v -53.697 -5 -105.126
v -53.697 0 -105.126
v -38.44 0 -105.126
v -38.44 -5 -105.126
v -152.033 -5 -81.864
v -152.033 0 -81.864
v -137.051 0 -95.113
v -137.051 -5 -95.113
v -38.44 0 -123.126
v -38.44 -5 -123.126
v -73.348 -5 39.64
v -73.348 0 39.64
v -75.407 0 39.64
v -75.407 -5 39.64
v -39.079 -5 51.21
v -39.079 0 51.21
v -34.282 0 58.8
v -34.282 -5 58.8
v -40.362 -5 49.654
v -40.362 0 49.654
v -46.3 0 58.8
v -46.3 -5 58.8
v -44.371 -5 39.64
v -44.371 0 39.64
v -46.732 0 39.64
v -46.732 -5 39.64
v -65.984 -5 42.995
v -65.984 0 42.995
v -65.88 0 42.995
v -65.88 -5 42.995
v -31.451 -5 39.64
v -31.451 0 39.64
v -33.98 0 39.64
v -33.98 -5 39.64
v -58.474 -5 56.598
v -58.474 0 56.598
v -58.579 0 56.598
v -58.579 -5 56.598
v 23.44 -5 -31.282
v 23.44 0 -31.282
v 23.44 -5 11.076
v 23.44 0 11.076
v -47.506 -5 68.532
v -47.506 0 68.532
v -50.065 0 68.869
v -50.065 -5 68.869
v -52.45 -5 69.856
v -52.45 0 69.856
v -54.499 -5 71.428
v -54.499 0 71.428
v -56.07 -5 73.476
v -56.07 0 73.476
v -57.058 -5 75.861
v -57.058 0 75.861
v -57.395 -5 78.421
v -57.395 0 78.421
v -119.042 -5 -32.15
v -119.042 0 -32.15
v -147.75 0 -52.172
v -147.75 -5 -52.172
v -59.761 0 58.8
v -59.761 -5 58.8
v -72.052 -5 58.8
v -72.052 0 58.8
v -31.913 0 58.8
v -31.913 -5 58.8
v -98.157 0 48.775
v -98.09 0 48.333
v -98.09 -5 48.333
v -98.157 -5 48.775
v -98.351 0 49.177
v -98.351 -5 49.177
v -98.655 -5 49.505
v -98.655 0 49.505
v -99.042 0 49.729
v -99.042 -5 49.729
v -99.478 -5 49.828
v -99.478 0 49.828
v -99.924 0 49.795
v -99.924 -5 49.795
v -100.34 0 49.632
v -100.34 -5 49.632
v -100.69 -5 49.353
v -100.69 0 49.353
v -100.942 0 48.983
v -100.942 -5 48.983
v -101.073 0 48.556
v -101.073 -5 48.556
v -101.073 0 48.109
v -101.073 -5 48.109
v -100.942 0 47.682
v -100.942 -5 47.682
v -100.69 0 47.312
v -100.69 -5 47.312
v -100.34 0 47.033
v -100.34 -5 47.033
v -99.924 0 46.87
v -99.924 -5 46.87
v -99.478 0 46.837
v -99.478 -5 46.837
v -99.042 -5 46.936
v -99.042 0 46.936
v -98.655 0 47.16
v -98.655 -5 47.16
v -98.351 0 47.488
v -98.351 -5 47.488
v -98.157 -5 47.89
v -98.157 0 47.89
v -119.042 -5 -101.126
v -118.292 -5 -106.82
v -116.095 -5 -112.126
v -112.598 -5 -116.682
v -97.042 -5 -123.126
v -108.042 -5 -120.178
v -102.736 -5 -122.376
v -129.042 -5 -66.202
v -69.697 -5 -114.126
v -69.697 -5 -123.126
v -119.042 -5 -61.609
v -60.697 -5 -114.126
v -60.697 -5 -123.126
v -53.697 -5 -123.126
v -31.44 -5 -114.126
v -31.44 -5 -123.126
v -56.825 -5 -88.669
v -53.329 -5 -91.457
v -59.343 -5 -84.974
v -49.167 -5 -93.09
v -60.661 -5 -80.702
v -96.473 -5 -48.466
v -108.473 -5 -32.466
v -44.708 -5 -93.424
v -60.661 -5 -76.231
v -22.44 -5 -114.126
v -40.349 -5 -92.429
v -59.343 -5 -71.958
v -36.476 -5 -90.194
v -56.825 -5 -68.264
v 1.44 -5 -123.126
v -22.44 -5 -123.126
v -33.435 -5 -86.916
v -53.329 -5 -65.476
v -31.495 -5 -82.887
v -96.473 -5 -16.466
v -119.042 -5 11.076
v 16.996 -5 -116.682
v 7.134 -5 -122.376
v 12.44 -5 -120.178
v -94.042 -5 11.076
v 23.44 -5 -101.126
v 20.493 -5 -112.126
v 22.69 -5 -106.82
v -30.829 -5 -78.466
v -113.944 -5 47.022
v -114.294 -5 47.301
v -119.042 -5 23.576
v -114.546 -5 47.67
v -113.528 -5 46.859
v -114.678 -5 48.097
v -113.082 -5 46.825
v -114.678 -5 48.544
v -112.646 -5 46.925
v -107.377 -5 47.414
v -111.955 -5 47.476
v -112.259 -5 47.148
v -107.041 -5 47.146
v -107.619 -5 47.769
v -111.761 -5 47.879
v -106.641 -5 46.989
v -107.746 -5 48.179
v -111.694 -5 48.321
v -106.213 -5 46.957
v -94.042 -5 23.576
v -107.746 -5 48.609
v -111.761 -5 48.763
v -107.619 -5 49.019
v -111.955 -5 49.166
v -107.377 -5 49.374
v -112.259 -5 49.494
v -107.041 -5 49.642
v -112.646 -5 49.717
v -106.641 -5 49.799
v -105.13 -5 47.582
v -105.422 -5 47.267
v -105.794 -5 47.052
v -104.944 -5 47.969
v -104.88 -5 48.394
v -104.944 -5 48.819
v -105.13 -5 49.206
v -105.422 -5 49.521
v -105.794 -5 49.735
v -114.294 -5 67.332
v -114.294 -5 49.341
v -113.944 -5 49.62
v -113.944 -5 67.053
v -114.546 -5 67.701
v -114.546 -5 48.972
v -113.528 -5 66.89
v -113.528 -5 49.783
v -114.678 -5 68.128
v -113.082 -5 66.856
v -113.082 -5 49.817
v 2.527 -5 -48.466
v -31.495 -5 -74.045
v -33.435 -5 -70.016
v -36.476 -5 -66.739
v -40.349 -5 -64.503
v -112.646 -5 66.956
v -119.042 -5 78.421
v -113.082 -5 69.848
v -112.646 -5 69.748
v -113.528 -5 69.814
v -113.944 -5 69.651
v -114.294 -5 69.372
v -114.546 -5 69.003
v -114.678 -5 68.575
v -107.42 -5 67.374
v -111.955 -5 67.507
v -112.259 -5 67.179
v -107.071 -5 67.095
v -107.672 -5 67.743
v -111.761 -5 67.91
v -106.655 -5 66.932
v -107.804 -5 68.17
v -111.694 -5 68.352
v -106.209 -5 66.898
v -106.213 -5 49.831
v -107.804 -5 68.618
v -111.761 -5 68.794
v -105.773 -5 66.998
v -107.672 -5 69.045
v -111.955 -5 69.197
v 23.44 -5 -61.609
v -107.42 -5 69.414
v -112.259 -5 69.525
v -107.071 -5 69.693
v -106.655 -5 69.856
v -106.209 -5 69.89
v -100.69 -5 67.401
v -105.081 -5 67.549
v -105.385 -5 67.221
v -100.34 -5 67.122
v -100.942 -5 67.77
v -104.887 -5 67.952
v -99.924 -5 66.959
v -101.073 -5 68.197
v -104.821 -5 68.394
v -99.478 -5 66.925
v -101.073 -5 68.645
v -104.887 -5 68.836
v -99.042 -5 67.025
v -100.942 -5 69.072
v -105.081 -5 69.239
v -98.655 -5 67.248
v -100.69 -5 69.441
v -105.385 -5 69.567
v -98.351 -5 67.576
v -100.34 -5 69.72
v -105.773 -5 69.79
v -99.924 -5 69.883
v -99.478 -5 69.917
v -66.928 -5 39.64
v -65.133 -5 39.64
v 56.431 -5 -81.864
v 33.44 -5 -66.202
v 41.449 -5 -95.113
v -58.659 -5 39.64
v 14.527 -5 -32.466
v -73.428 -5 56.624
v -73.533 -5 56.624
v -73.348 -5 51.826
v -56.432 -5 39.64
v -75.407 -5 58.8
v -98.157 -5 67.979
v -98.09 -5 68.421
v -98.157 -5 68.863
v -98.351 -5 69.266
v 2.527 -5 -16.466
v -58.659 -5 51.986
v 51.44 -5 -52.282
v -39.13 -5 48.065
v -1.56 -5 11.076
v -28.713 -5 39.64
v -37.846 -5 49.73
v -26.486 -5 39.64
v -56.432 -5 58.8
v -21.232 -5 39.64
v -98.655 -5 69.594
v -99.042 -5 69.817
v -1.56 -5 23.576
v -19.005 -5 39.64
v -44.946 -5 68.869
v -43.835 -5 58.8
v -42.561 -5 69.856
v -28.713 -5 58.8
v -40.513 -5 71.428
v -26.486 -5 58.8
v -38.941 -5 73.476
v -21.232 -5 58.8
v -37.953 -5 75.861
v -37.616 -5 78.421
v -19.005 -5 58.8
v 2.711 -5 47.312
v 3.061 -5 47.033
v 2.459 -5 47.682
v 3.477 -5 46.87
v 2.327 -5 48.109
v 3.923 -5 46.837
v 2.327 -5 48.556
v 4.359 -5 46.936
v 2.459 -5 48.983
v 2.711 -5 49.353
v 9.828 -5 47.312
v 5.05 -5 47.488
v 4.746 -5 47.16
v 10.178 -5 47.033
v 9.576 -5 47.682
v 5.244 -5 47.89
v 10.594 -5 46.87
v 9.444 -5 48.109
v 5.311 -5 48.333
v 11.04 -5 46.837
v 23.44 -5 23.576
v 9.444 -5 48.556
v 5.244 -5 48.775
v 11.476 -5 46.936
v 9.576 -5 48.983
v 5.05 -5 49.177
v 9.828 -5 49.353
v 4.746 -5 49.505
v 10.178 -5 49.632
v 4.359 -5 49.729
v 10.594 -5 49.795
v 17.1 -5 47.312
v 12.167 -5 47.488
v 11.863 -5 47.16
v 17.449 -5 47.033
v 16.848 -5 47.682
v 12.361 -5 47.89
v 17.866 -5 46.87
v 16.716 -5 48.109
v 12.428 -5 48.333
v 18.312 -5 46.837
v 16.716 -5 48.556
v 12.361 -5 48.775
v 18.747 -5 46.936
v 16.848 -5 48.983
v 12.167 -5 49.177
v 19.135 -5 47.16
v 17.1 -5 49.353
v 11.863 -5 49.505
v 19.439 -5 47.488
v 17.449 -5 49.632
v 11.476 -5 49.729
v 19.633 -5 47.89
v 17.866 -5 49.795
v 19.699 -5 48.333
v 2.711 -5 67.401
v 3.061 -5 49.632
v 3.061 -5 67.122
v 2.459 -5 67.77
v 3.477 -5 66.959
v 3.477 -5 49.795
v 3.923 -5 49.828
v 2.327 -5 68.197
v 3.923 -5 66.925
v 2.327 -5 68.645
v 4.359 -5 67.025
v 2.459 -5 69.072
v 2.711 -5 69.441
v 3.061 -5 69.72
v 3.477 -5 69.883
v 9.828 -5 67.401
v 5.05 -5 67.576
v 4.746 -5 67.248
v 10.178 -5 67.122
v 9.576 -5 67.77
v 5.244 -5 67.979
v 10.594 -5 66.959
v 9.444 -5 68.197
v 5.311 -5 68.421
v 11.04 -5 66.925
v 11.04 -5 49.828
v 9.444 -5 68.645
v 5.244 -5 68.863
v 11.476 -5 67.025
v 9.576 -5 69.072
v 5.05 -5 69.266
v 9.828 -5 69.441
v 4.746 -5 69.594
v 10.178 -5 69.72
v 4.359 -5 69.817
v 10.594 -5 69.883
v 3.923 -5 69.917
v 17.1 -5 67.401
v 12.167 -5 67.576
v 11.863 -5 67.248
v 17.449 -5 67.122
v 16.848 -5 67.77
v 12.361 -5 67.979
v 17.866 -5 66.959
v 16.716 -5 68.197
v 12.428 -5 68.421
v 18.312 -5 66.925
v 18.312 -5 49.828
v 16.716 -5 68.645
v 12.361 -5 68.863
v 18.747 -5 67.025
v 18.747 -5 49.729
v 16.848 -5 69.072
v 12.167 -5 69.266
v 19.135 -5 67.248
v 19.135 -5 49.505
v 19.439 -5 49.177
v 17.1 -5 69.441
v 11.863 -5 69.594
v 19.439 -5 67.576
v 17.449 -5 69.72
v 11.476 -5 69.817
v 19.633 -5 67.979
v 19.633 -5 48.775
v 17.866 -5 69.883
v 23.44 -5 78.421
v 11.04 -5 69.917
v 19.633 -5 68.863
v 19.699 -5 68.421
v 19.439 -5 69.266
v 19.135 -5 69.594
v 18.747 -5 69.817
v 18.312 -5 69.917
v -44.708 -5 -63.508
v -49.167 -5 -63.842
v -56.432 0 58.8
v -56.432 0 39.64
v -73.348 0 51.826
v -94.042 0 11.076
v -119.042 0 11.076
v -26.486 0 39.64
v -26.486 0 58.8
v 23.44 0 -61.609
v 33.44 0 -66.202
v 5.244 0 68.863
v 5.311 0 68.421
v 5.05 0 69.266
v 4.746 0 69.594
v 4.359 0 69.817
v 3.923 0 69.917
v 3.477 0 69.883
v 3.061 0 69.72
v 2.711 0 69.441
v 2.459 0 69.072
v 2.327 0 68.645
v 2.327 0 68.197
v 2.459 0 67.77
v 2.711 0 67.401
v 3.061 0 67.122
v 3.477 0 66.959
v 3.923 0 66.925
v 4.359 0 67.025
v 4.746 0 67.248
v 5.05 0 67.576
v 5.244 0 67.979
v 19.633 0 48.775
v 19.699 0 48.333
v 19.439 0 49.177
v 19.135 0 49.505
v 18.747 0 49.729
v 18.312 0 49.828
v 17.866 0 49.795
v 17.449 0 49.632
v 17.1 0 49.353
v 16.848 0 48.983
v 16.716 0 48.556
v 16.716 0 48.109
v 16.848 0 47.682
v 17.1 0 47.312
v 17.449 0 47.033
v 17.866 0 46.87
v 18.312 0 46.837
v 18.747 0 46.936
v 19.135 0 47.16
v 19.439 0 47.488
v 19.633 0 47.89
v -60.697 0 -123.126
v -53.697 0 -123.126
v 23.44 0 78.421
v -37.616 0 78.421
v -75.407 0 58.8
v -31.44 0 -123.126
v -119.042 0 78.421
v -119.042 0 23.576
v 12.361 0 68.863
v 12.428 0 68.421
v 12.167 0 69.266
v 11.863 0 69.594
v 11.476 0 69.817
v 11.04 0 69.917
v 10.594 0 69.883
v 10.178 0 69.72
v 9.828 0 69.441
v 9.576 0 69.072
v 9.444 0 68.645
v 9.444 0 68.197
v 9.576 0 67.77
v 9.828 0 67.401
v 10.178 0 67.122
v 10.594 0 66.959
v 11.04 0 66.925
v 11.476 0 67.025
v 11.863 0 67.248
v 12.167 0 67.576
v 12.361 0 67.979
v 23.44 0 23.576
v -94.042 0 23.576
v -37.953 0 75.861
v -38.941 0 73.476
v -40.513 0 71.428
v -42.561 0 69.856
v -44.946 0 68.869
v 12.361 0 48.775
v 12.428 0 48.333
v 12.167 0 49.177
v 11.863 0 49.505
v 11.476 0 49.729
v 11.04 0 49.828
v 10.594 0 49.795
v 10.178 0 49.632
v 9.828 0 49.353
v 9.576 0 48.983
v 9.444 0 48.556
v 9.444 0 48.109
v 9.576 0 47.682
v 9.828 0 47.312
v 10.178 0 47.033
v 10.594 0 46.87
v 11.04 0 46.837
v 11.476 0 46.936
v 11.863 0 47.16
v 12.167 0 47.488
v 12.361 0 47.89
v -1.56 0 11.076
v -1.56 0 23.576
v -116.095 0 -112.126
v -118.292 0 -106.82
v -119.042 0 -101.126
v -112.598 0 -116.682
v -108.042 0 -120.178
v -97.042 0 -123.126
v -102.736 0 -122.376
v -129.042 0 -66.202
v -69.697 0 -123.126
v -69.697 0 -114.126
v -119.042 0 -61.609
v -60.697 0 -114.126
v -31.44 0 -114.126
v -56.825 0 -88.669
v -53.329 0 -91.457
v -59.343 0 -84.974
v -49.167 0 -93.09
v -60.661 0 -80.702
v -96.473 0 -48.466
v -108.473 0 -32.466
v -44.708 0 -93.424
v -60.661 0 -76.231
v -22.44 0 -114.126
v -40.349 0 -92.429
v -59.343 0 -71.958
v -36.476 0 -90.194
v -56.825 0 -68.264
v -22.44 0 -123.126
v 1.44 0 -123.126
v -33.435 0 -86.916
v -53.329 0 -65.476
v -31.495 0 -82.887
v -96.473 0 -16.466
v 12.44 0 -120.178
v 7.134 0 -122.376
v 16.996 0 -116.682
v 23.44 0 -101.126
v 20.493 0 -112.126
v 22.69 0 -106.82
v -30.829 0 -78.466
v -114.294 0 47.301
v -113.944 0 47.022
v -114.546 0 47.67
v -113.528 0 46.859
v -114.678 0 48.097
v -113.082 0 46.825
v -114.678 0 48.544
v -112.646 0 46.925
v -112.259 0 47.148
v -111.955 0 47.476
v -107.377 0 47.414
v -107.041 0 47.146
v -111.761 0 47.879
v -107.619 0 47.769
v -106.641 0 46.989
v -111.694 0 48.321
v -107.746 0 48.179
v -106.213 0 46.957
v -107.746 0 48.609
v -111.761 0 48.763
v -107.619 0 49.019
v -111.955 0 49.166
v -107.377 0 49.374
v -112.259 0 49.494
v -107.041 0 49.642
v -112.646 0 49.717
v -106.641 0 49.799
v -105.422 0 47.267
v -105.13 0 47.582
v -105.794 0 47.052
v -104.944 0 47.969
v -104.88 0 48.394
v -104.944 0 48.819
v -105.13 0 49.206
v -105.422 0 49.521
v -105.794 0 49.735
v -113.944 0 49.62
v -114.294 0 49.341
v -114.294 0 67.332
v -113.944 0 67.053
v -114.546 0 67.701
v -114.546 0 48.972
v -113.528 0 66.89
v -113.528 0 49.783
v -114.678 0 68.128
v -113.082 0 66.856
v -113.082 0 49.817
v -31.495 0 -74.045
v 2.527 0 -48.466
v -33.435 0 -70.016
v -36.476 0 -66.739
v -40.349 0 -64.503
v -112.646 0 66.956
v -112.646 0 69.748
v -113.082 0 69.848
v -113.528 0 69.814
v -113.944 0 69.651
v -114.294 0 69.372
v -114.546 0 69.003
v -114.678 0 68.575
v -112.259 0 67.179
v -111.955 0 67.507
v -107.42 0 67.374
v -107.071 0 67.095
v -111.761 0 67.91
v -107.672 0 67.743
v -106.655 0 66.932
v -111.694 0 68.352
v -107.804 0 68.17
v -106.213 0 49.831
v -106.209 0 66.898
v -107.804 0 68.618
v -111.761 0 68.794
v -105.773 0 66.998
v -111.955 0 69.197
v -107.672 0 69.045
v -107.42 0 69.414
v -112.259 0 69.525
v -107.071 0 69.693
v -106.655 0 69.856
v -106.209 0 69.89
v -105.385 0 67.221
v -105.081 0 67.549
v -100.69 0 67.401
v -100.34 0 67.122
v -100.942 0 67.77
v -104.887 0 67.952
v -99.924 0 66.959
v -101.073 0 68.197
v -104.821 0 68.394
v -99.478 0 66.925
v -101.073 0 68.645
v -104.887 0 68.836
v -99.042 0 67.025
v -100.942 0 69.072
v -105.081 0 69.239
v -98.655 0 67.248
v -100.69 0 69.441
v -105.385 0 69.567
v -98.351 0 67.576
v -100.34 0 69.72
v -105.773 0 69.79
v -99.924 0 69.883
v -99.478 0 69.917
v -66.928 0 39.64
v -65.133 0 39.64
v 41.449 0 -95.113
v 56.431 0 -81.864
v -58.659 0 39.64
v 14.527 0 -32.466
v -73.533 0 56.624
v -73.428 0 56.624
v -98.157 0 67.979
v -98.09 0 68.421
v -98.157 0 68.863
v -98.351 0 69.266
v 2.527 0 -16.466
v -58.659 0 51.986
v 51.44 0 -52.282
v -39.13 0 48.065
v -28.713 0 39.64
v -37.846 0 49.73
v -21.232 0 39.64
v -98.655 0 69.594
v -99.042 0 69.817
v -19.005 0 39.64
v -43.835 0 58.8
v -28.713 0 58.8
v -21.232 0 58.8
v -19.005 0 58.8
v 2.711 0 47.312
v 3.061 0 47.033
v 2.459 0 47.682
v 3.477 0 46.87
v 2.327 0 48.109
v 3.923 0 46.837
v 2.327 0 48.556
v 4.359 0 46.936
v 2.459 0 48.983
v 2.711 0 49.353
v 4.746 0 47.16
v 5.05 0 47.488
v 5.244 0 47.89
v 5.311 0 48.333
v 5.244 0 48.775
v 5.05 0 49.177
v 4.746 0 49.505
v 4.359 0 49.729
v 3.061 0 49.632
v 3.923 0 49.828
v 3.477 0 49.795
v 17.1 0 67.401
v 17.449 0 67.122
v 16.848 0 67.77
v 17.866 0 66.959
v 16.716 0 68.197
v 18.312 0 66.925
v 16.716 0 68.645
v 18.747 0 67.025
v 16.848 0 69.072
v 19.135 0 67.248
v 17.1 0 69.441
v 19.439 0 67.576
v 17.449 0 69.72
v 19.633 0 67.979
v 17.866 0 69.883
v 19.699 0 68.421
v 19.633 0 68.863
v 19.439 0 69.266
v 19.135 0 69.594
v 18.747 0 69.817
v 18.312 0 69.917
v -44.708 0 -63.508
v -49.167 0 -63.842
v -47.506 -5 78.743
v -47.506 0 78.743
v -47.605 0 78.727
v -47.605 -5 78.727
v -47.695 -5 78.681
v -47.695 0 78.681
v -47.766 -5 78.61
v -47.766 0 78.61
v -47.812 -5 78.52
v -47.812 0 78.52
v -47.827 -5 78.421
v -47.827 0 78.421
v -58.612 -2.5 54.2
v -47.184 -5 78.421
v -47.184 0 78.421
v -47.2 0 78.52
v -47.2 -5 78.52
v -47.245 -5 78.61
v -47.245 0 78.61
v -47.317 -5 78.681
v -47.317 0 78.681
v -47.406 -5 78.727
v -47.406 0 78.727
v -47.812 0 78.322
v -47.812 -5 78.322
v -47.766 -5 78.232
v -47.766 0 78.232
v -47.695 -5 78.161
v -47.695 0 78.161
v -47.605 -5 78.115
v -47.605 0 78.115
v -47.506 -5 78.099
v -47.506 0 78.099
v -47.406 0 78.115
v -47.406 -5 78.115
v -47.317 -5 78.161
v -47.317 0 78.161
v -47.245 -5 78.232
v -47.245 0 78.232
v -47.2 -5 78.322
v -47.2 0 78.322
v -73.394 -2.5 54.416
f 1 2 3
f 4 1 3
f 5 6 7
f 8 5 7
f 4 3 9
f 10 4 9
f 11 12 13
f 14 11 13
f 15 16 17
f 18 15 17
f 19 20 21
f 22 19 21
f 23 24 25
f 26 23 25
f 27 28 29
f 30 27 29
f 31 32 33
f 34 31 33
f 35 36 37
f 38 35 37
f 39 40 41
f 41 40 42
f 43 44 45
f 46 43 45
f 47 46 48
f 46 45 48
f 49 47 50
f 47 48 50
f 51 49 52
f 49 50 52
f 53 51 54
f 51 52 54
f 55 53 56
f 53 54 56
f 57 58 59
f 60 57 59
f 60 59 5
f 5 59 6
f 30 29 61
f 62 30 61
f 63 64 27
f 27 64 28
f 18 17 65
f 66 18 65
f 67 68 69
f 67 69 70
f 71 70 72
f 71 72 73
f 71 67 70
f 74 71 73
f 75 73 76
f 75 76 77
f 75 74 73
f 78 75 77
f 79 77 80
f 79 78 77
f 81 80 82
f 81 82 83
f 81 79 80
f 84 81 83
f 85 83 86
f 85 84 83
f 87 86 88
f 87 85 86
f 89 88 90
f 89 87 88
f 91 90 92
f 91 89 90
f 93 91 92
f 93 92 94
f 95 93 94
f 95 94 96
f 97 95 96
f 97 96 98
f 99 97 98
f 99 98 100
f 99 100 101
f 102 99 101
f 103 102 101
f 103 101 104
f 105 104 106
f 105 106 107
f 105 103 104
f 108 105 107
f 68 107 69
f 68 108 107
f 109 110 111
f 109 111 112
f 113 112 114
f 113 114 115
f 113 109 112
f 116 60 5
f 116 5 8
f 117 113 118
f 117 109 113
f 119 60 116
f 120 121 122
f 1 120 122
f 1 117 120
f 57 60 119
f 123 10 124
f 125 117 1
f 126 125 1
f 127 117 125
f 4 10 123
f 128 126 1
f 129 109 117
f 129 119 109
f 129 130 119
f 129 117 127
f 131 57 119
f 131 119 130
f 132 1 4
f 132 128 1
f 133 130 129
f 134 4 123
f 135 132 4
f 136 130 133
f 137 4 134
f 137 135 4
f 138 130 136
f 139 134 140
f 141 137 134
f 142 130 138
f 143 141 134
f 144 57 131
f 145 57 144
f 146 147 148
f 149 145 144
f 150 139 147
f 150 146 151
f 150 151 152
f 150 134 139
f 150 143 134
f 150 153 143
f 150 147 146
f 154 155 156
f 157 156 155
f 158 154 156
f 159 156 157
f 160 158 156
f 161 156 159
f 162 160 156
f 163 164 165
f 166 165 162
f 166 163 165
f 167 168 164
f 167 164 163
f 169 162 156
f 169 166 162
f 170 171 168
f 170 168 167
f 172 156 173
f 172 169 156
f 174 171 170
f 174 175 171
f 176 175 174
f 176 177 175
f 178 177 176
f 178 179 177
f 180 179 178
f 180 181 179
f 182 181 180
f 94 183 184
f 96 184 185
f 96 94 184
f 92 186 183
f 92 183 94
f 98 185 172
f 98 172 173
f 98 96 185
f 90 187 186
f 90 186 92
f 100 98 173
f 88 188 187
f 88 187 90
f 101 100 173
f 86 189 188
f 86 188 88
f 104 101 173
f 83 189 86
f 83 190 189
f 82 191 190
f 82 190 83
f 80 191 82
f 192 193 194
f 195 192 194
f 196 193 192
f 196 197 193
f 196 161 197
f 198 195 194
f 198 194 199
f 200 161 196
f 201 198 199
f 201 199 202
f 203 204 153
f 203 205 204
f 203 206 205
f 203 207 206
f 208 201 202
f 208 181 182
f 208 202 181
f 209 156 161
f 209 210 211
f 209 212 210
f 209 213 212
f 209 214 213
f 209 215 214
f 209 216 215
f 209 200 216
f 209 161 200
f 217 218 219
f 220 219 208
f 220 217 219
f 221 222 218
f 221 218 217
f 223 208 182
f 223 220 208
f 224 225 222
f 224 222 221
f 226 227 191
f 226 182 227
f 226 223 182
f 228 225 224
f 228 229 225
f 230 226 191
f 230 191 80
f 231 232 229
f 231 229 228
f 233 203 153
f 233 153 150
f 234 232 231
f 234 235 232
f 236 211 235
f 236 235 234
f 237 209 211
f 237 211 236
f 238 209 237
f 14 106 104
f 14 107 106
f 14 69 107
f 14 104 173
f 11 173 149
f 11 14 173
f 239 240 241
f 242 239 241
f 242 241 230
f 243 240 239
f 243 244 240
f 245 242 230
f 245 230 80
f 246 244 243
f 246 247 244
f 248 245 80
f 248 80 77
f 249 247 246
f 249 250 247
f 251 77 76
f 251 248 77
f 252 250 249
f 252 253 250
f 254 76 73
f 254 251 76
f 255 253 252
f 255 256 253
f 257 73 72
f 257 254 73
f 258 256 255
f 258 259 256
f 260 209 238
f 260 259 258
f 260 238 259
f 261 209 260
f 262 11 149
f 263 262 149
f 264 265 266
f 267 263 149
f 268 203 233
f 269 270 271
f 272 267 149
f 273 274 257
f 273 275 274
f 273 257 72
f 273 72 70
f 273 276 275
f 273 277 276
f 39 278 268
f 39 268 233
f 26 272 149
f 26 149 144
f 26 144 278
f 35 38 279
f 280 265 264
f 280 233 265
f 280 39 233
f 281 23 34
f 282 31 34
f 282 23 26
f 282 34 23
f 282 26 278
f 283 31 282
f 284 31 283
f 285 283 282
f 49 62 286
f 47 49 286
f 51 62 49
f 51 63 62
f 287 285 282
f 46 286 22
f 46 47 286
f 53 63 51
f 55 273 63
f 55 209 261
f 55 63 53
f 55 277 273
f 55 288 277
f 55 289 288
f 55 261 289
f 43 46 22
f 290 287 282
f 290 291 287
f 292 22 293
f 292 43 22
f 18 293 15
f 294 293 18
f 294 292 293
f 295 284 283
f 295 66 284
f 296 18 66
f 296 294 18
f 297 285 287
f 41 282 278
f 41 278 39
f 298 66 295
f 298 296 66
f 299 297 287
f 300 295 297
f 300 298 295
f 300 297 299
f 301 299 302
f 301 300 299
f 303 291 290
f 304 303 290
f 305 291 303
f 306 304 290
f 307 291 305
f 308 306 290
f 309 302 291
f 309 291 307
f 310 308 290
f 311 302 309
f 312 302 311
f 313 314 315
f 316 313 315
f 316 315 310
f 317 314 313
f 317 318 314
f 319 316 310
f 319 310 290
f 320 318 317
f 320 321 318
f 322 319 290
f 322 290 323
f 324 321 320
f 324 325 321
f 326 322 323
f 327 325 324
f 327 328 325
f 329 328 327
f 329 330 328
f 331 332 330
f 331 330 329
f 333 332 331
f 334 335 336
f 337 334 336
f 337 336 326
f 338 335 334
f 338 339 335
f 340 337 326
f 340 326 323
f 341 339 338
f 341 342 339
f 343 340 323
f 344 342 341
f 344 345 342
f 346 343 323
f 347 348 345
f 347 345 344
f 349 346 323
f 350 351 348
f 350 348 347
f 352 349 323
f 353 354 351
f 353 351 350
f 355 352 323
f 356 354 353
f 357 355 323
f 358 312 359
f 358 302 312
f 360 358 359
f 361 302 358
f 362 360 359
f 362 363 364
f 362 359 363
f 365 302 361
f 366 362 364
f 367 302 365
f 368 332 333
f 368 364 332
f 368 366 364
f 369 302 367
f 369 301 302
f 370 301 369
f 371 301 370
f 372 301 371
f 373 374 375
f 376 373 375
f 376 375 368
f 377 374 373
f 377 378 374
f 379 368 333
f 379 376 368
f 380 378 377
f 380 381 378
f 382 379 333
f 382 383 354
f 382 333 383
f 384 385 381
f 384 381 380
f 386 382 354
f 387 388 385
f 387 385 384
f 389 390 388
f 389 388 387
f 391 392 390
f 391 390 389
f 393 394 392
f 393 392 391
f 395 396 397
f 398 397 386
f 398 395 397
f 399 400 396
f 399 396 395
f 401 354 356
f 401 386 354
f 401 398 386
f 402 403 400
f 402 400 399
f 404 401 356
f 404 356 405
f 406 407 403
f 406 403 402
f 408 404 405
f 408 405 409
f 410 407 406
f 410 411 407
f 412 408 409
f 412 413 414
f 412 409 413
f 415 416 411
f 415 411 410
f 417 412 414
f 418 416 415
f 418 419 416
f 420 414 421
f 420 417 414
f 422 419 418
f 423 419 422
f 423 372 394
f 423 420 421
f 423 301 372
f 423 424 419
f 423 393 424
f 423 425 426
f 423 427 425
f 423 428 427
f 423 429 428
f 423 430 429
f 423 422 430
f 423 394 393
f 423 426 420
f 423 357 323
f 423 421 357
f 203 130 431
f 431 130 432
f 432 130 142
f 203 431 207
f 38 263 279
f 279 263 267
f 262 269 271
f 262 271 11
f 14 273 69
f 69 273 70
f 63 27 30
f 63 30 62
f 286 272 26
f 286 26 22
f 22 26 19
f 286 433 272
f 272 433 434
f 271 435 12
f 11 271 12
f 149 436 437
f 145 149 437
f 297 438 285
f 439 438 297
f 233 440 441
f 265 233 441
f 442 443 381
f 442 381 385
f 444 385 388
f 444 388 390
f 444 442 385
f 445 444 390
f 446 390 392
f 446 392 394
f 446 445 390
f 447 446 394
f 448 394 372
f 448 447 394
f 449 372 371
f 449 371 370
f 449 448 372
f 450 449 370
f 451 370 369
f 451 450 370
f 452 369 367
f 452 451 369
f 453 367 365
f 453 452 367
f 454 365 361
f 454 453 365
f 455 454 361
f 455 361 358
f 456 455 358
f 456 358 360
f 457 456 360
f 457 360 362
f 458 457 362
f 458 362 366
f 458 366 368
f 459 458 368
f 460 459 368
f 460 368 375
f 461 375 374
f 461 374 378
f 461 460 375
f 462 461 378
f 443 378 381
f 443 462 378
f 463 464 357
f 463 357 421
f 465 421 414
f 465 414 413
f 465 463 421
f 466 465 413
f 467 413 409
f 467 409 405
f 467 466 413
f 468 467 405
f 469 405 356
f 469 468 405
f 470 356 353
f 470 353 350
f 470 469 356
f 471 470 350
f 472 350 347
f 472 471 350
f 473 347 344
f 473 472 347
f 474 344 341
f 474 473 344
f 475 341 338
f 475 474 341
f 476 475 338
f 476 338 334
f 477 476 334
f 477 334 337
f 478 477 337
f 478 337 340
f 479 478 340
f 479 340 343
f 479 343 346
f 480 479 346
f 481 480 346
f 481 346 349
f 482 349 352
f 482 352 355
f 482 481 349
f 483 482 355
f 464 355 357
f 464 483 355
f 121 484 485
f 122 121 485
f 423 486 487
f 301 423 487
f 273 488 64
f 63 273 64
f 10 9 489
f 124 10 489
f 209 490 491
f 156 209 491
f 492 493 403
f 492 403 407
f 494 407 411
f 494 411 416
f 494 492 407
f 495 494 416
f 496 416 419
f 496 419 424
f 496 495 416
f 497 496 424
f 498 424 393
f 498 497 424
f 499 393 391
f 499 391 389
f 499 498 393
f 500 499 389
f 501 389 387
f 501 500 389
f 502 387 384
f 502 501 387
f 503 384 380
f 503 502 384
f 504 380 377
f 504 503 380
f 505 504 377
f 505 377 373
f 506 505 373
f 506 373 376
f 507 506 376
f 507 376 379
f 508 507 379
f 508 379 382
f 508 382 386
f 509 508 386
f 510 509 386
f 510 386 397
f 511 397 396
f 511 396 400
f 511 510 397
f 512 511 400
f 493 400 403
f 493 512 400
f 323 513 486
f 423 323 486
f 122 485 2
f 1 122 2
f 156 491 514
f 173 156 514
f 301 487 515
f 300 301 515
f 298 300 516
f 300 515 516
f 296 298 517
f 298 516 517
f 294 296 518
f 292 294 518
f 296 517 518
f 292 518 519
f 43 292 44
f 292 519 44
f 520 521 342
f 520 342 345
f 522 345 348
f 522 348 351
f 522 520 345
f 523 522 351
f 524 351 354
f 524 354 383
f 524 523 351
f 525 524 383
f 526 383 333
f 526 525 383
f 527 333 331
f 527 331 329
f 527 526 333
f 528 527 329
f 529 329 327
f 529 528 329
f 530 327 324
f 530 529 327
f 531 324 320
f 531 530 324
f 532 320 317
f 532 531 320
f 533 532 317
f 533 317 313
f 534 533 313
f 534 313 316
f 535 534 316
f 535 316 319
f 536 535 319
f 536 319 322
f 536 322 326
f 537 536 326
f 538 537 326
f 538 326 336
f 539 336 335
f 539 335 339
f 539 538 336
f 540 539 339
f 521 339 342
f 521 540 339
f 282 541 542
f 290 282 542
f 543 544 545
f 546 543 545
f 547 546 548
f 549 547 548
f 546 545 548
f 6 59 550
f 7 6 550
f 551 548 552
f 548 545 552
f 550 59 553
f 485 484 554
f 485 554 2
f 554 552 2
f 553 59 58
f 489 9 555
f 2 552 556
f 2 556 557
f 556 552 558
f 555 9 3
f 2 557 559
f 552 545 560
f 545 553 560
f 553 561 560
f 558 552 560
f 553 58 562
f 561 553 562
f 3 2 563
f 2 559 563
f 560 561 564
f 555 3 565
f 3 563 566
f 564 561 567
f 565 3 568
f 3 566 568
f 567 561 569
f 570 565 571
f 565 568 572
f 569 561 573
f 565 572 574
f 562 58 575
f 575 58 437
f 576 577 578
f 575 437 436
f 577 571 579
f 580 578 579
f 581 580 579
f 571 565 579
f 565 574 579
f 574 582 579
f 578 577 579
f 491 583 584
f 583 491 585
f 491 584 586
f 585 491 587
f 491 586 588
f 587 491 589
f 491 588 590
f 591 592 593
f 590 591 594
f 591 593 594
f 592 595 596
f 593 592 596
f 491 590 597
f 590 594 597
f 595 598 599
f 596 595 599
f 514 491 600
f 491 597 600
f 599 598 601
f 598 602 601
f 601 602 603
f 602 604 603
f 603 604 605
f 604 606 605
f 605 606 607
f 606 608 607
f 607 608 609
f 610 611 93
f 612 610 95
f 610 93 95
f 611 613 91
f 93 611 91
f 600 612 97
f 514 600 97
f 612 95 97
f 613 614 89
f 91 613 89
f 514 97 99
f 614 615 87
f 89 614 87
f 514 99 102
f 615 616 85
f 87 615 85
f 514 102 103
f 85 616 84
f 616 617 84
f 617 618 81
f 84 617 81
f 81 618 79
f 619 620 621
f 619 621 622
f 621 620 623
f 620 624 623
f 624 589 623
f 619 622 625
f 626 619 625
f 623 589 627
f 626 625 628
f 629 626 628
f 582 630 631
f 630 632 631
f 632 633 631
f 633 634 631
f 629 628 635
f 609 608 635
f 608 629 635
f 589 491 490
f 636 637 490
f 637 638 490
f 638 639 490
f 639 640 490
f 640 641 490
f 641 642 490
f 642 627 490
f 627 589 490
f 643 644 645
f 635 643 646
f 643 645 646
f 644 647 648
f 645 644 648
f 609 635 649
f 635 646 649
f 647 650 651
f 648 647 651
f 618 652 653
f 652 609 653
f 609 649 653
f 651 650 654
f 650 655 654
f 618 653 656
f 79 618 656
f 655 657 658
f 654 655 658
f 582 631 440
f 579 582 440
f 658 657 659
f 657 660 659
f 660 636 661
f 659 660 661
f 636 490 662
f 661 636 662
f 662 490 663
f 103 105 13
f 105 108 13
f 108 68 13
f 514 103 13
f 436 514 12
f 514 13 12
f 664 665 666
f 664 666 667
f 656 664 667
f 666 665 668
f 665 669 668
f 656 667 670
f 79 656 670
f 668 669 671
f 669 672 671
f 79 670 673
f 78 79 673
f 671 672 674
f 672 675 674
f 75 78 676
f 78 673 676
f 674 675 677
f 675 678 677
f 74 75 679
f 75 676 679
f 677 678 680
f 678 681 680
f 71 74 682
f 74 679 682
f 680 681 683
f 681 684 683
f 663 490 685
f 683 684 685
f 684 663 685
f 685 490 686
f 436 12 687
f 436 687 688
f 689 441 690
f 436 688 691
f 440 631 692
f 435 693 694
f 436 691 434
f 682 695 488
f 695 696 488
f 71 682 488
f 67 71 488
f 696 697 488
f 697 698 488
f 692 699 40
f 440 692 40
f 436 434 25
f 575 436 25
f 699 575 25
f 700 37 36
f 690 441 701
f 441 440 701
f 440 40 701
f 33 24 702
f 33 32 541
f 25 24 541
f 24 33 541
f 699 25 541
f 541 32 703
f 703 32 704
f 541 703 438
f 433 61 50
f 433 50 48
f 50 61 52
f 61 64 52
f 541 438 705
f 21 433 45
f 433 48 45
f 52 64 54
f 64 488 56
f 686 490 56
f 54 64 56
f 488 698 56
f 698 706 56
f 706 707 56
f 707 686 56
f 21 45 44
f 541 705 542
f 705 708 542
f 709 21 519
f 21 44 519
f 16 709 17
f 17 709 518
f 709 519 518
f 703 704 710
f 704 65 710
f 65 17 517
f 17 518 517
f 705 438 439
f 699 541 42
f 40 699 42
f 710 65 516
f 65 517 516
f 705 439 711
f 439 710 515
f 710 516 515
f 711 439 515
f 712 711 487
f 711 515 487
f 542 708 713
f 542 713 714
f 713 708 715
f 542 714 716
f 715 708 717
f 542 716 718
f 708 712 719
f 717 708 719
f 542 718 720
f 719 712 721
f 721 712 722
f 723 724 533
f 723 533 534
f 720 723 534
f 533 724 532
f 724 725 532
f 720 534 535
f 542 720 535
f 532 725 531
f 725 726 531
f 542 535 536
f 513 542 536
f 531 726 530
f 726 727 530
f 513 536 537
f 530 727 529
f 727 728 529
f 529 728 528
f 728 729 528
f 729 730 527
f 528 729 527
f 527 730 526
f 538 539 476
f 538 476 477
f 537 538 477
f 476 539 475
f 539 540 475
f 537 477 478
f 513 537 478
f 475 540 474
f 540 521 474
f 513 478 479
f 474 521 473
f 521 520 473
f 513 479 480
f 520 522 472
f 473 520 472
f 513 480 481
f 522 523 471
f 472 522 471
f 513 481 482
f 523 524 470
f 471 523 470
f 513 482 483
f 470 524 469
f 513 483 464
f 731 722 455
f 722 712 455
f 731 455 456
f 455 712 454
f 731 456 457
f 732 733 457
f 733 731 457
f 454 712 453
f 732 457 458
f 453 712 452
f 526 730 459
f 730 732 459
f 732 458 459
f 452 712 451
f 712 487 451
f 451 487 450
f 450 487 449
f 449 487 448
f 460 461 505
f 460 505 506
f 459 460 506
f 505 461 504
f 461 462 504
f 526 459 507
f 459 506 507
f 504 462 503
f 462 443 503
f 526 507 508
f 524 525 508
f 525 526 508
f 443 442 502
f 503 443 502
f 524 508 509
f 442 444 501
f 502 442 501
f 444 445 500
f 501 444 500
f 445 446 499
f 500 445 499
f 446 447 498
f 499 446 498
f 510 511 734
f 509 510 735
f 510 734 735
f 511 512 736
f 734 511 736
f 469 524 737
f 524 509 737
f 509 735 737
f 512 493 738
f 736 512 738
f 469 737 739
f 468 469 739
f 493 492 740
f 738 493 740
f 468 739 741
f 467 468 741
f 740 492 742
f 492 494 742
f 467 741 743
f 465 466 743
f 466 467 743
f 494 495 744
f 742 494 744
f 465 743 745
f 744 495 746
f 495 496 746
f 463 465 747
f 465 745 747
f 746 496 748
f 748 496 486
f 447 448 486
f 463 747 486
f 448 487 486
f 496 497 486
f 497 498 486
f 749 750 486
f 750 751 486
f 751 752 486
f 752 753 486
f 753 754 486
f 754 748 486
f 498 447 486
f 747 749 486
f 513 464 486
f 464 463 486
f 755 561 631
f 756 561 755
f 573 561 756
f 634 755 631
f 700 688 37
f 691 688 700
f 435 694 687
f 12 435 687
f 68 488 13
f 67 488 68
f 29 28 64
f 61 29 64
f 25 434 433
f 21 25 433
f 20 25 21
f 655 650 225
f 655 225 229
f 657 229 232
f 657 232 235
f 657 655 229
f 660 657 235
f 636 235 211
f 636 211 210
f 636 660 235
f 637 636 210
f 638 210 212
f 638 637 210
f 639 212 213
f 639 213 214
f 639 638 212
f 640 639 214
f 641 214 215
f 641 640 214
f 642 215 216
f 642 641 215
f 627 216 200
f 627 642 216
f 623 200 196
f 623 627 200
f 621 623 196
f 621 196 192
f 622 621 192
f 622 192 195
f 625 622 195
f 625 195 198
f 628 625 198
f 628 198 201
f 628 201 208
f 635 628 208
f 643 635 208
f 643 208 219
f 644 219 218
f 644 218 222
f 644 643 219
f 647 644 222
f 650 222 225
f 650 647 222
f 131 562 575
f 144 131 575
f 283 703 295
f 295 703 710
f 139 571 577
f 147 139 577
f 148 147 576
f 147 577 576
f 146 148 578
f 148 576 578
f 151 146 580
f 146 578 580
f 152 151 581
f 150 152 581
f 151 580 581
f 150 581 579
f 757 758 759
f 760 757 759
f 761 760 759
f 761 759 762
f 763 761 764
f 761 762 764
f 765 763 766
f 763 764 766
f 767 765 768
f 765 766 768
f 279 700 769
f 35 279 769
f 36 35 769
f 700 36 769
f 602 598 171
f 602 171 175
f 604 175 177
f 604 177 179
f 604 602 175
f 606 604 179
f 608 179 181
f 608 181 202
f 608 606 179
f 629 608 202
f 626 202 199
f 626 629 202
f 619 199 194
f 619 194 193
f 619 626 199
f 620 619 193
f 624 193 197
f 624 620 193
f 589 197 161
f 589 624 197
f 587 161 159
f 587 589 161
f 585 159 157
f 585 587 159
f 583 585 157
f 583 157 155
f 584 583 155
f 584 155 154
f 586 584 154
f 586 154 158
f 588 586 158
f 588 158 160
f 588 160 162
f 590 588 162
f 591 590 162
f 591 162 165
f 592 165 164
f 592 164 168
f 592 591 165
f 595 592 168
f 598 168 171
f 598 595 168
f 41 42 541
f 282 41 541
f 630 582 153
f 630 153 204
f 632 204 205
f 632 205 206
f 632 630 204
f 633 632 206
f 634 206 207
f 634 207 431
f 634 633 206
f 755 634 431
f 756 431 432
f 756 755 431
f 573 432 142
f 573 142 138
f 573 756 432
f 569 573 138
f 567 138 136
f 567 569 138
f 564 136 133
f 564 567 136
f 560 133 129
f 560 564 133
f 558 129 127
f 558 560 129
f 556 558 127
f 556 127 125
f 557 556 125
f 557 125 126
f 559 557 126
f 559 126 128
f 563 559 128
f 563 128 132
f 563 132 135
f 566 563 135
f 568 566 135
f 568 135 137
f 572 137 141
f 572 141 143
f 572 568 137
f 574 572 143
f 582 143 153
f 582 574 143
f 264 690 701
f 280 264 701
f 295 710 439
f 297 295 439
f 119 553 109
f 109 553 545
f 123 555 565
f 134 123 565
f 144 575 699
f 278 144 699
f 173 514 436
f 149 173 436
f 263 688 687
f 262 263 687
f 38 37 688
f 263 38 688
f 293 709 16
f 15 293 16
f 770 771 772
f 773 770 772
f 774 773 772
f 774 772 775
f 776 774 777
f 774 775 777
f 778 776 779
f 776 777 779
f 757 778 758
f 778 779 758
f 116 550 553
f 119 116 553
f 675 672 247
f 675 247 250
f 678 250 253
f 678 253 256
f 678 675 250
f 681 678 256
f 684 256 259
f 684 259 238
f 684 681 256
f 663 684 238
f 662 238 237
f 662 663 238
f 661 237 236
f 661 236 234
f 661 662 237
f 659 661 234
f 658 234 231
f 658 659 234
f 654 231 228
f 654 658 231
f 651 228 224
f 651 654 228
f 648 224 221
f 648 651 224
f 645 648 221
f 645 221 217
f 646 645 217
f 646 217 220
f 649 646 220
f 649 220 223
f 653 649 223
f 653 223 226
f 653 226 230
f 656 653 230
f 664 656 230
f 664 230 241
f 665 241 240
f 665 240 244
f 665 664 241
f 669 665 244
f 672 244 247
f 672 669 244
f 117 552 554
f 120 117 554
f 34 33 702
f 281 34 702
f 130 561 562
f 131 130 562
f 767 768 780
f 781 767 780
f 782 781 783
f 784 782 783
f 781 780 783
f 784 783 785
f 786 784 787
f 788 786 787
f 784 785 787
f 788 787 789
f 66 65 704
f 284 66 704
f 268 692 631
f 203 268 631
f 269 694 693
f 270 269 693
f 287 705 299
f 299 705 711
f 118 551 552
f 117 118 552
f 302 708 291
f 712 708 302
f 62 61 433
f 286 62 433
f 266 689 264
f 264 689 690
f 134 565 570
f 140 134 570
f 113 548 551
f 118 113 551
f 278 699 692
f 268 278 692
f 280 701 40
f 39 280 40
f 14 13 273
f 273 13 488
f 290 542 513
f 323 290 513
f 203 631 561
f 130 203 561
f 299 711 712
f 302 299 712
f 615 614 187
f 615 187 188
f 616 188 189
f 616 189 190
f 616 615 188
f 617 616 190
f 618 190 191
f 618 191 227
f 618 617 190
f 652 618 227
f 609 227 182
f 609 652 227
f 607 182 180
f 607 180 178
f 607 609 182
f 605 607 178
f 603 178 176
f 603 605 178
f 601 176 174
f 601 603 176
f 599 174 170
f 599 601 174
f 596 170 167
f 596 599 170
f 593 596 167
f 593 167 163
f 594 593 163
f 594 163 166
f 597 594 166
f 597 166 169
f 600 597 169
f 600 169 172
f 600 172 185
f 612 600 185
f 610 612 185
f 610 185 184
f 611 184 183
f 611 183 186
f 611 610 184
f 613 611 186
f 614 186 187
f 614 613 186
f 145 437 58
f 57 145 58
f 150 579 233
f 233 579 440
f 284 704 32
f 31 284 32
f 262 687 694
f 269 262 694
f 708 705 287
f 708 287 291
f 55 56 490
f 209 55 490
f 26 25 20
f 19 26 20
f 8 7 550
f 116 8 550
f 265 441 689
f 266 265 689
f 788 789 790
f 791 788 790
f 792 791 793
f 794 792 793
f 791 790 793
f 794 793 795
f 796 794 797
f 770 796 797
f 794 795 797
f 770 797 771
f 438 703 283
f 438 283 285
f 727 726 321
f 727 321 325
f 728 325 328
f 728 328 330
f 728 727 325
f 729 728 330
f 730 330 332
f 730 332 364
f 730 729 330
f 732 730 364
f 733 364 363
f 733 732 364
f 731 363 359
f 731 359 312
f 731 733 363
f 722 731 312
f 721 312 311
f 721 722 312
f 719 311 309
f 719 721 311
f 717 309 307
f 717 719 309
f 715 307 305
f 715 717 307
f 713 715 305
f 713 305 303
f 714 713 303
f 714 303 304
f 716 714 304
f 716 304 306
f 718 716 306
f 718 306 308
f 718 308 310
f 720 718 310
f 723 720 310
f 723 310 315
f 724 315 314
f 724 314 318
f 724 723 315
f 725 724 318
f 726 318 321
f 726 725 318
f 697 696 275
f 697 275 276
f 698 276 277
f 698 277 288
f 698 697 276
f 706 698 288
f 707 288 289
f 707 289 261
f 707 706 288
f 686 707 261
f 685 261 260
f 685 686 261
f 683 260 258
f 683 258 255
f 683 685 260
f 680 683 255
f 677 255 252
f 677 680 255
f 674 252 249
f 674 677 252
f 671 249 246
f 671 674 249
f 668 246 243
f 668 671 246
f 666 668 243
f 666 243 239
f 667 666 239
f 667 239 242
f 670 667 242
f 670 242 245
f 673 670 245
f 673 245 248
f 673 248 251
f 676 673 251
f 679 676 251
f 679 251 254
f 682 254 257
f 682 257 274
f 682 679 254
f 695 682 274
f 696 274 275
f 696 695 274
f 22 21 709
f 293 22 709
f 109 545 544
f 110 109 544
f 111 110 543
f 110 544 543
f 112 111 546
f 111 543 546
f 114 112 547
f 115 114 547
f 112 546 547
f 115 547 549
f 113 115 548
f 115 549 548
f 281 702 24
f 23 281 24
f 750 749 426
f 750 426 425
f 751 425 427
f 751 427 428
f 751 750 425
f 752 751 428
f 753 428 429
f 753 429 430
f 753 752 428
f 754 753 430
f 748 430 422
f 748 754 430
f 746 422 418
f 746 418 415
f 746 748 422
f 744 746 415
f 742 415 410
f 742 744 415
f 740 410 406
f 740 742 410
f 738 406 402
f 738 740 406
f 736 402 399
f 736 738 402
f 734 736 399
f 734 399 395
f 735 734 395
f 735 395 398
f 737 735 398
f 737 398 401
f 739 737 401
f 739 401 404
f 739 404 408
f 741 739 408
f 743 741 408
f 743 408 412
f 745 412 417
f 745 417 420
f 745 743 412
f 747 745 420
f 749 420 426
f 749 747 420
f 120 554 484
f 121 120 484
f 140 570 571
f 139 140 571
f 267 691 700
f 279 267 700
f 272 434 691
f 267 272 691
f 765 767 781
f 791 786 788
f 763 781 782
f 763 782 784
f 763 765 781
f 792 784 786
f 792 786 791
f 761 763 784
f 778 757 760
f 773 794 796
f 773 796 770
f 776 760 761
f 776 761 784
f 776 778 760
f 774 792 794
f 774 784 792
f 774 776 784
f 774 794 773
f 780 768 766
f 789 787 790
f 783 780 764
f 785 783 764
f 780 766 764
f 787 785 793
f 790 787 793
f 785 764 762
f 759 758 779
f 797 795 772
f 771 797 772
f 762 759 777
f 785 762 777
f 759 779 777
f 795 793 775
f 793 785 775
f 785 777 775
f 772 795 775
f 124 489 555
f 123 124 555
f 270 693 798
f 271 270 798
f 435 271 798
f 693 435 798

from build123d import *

# Parameters (mm, degrees)
F0_R     = 15
F0_R_2   = 1.5
F0_R_3   = 1.441072342
F0_W     = 2.2267277818
F0_H     = 19.15992323
F1_DEPTH = 5
F2_DEPTH = 5


with BuildPart() as f1:
    # F0 (on Front) → F1 (new body)
    with BuildSketch(Plane.XZ):
        with BuildLine():
            Line((-57.3951144738, 78.4210244134), (-119.0419751526, 78.4210244134))
            Line((-119.0419751526, 78.4210244134), (-119.0419751526, 23.5764375642))
            Line((-119.0419751526, 23.5764375642), (-94.0419751526, 23.5764375642))
            Line((-94.0419751526, 23.5764375642), (-94.0419751526, 11.0764375642))
            Line((-94.0419751526, 11.0764375642), (-119.0419751526, 11.0764375642))
            Line((-119.0419751526, 11.0764375642), (-119.0419751526, -32.1499912984))
            Line((-119.0419751526, -32.1499912984), (-119.0419751526, -61.6089515388))
            Line((-119.0419751526, -61.6089515388), (-119.0419751526, -101.1258891719))
            ThreePointArc((-119.0419751526, -101.1258891719), (-112.5983243387, -116.682238358), (-97.0419751526, -123.1258891719))
            Line((-97.0419751526, -123.1258891719), (-69.6967765689, -123.1258891719))
            Line((-69.6967765689, -123.1258891719), (-69.6967765689, -114.1258891719))
            Line((-69.6967765689, -114.1258891719), (-60.6967765689, -114.1258891719))
            Line((-60.6967765689, -114.1258891719), (-60.6967765689, -123.1258891719))
            Line((-60.6967765689, -123.1258891719), (-53.6967765689, -123.1258891719))
            Line((-53.6967765689, -123.1258891719), (-53.6967765689, -105.1258891719))
            Line((-53.6967765689, -105.1258891719), (-38.4397715134, -105.1258891719))
            Line((-38.4397715134, -105.1258891719), (-38.4397715134, -123.1258891719))
            Line((-38.4397715134, -123.1258891719), (-31.4397715134, -123.1258891719))
            Line((-31.4397715134, -123.1258891719), (-31.4397715134, -114.1258891719))
            Line((-31.4397715134, -114.1258891719), (-22.4397715134, -114.1258891719))
            Line((-22.4397715134, -114.1258891719), (-22.4397715134, -123.1258891719))
            Line((-22.4397715134, -123.1258891719), (1.4399430895, -123.1258891719))
            ThreePointArc((1.4399430895, -123.1258891719), (16.9962922756, -116.682238358), (23.4399430895, -101.1258891719))
            Line((23.4399430895, -101.1258891719), (23.4399430895, -61.6089515388))
            Line((23.4399430895, -61.6089515388), (23.4399430895, -31.2823932228))
            Line((23.4399430895, -31.2823932228), (23.4399430895, 11.0764375642))
            Line((23.4399430895, 11.0764375642), (-1.5600569105, 11.0764375642))
            Line((-1.5600569105, 11.0764375642), (-1.5600569105, 23.5764375642))
            Line((-1.5600569105, 23.5764375642), (23.4399430895, 23.5764375642))
            Line((23.4399430895, 23.5764375642), (23.4399430895, 68.4210244134))
            Line((23.4399430895, 68.4210244134), (23.4399430895, 78.4210244134))
            Line((23.4399430895, 78.4210244134), (-37.6161391418, 78.4210244134))
            ThreePointArc((-37.6161391418, 78.4210244134), (-40.5127030167, 71.4281006223), (-47.5056268078, 68.5315367474))
            ThreePointArc((-47.5056268078, 68.5315367474), (-54.4985505989, 71.4281006223), (-57.3951144738, 78.4210244134))
        make_face()
        with Locations((-45.8287447691, -78.4661704674)):
            Circle(F0_R, mode=Mode.SUBTRACT)
        Polygon((-108.4734608098, -32.4661704674), (-96.4734608098, -16.4661704674), (2.5265391902, -16.4661704674), (14.5265391902, -32.4661704674), (2.5265391902, -48.4661704674), (-96.4734608098, -48.4661704674), align=None, mode=Mode.SUBTRACT)
        with Locations((-113.1943613291, 48.3209192753)):
            Circle(F0_R_2, mode=Mode.SUBTRACT)
        with Locations((-106.3207313418, 48.3939448312)):
            Circle(F0_R_3, mode=Mode.SUBTRACT)
        with Locations((-113.1943613291, 68.3518946171)):
            Circle(F0_R_2, mode=Mode.SUBTRACT)
        with Locations((-106.3207313418, 68.3939448312)):
            Circle(F0_R_2, mode=Mode.SUBTRACT)
        with Locations((-99.5902121067, 48.3325049281)):
            Circle(F0_R_2, mode=Mode.SUBTRACT)
        with BuildLine():
            Line((-65.1332163252, 39.6400615573), (-66.9280176258, 39.6400615573))
            Line((-66.9280176258, 39.6400615573), (-73.427882149, 56.6235785373))
            Line((-73.427882149, 56.6235785373), (-73.5327186736, 56.6235785373))
            add(Edge.make_bspline(
                [(-73.5327186736, 56.6235785373), (-73.3482063903, 54.6065238046), (-73.3482063903, 51.826259173)],
                knots=[0, 0, 0, 1, 1, 1], degree=2))
            Line((-73.3482063903, 51.826259173), (-73.3482063903, 39.6400615573))
            Line((-73.3482063903, 39.6400615573), (-75.4071957328, 39.6400615573))
            Line((-75.4071957328, 39.6400615573), (-75.4071957328, 58.7999847873))
            Line((-75.4071957328, 58.7999847873), (-72.0524269467, 58.7999847873))
            Line((-72.0524269467, 58.7999847873), (-65.9844889047, 42.9948303435))
            Line((-65.9844889047, 42.9948303435), (-65.8796523801, 42.9948303435))
            Line((-65.8796523801, 42.9948303435), (-59.7613928063, 58.7999847873))
            Line((-59.7613928063, 58.7999847873), (-56.4317847861, 58.7999847873))
            Line((-56.4317847861, 58.7999847873), (-56.4317847861, 39.6400615573))
            Line((-56.4317847861, 39.6400615573), (-58.6585125679, 39.6400615573))
            Line((-58.6585125679, 39.6400615573), (-58.6585125679, 51.9856106904))
            add(Edge.make_bspline(
                [(-58.6585125679, 51.9856106904), (-58.6585125679, 54.1075019476), (-58.4740002847, 56.5984177714)],
                knots=[0, 0, 0, 1, 1, 1], degree=2))
            Line((-58.4740002847, 56.5984177714), (-58.5788368092, 56.5984177714))
            Line((-58.5788368092, 56.5984177714), (-65.1332163252, 39.6400615573))
        make_face(mode=Mode.SUBTRACT)
        with Locations((-99.5902121067, 68.4210244134)):
            Circle(F0_R_2, mode=Mode.SUBTRACT)
        Polygon((-37.8463657107, 49.7295286817), (-31.4513377121, 39.6400615573), (-33.9799946847, 39.6400615573), (-39.1295647714, 48.0647246716), (-44.3713909998, 39.6400615573), (-46.7323095331, 39.6400615573), (-40.3624423003, 49.654046384), (-46.3003830519, 58.7999847873), (-43.834627994, 58.7999847873), (-39.0792432396, 51.2098204086), (-34.2819238754, 58.7999847873), (-31.9126184202, 58.7999847873), align=None, mode=Mode.SUBTRACT)
        with Locations((-27.5996437995, 49.2200231723)):
            Rectangle(F0_W, F0_H, mode=Mode.SUBTRACT)
        with Locations((-20.1185094063, 49.2200231723)):
            Rectangle(F0_W, F0_H, mode=Mode.SUBTRACT)
        with Locations((3.8105277345, 48.3325049281)):
            Circle(F0_R_2, mode=Mode.SUBTRACT)
        with Locations((3.8105277345, 68.4210244134)):
            Circle(F0_R_2, mode=Mode.SUBTRACT)
        with Locations((10.9275467694, 48.3325049281)):
            Circle(F0_R_2, mode=Mode.SUBTRACT)
        with Locations((18.1994624436, 48.3325049281)):
            Circle(F0_R_2, mode=Mode.SUBTRACT)
        with Locations((10.9275467694, 68.4210244134)):
            Circle(F0_R_2, mode=Mode.SUBTRACT)
        with Locations((18.1994624436, 68.4210244134)):
            Circle(F0_R_2, mode=Mode.SUBTRACT)
        Polygon((-119.0419751526, -61.6089515388), (-119.0419751526, -32.1499912984), (-147.7496829089, -52.1716674367), (-152.0327921053, -81.8643428906), (-137.0507371719, -95.1134194612), (-129.0419751526, -66.2021806272), align=None)
        Polygon((51.4399430895, -52.2823932228), (23.4399430895, -31.2823932228), (23.4399430895, -61.6089515388), (33.4399430895, -66.2021806272), (41.4487051088, -95.1134194612), (56.4307600421, -81.8643428906), align=None)
    extrude(amount=F1_DEPTH)

    # F0 (on Front) → F2 (join)
    with BuildSketch(Plane.XZ):
        with BuildLine():
            Line((-57.3951144738, 78.4210244134), (-119.0419751526, 78.4210244134))
            Line((-119.0419751526, 78.4210244134), (-119.0419751526, 23.5764375642))
            Line((-119.0419751526, 23.5764375642), (-94.0419751526, 23.5764375642))
            Line((-94.0419751526, 23.5764375642), (-94.0419751526, 11.0764375642))
            Line((-94.0419751526, 11.0764375642), (-119.0419751526, 11.0764375642))
            Line((-119.0419751526, 11.0764375642), (-119.0419751526, -32.1499912984))
            Line((-119.0419751526, -32.1499912984), (-119.0419751526, -61.6089515388))
            Line((-119.0419751526, -61.6089515388), (-119.0419751526, -101.1258891719))
            ThreePointArc((-119.0419751526, -101.1258891719), (-112.5983243387, -116.682238358), (-97.0419751526, -123.1258891719))
            Line((-97.0419751526, -123.1258891719), (-69.6967765689, -123.1258891719))
            Line((-69.6967765689, -123.1258891719), (-69.6967765689, -114.1258891719))
            Line((-69.6967765689, -114.1258891719), (-60.6967765689, -114.1258891719))
            Line((-60.6967765689, -114.1258891719), (-60.6967765689, -123.1258891719))
            Line((-60.6967765689, -123.1258891719), (-53.6967765689, -123.1258891719))
            Line((-53.6967765689, -123.1258891719), (-53.6967765689, -105.1258891719))
            Line((-53.6967765689, -105.1258891719), (-38.4397715134, -105.1258891719))
            Line((-38.4397715134, -105.1258891719), (-38.4397715134, -123.1258891719))
            Line((-38.4397715134, -123.1258891719), (-31.4397715134, -123.1258891719))
            Line((-31.4397715134, -123.1258891719), (-31.4397715134, -114.1258891719))
            Line((-31.4397715134, -114.1258891719), (-22.4397715134, -114.1258891719))
            Line((-22.4397715134, -114.1258891719), (-22.4397715134, -123.1258891719))
            Line((-22.4397715134, -123.1258891719), (1.4399430895, -123.1258891719))
            ThreePointArc((1.4399430895, -123.1258891719), (16.9962922756, -116.682238358), (23.4399430895, -101.1258891719))
            Line((23.4399430895, -101.1258891719), (23.4399430895, -61.6089515388))
            Line((23.4399430895, -61.6089515388), (23.4399430895, -31.2823932228))
            Line((23.4399430895, -31.2823932228), (23.4399430895, 11.0764375642))
            Line((23.4399430895, 11.0764375642), (-1.5600569105, 11.0764375642))
            Line((-1.5600569105, 11.0764375642), (-1.5600569105, 23.5764375642))
            Line((-1.5600569105, 23.5764375642), (23.4399430895, 23.5764375642))
            Line((23.4399430895, 23.5764375642), (23.4399430895, 68.4210244134))
            Line((23.4399430895, 68.4210244134), (23.4399430895, 78.4210244134))
            Line((23.4399430895, 78.4210244134), (-37.6161391418, 78.4210244134))
            ThreePointArc((-37.6161391418, 78.4210244134), (-40.5127030167, 71.4281006223), (-47.5056268078, 68.5315367474))
            ThreePointArc((-47.5056268078, 68.5315367474), (-54.4985505989, 71.4281006223), (-57.3951144738, 78.4210244134))
        make_face()
        with Locations((-45.8287447691, -78.4661704674)):
            Circle(F0_R, mode=Mode.SUBTRACT)
        Polygon((-108.4734608098, -32.4661704674), (-96.4734608098, -16.4661704674), (2.5265391902, -16.4661704674), (14.5265391902, -32.4661704674), (2.5265391902, -48.4661704674), (-96.4734608098, -48.4661704674), align=None, mode=Mode.SUBTRACT)
        with Locations((-113.1943613291, 48.3209192753)):
            Circle(F0_R_2, mode=Mode.SUBTRACT)
        with Locations((-106.3207313418, 48.3939448312)):
            Circle(F0_R_3, mode=Mode.SUBTRACT)
        with Locations((-113.1943613291, 68.3518946171)):
            Circle(F0_R_2, mode=Mode.SUBTRACT)
        with Locations((-106.3207313418, 68.3939448312)):
            Circle(F0_R_2, mode=Mode.SUBTRACT)
        with Locations((-99.5902121067, 48.3325049281)):
            Circle(F0_R_2, mode=Mode.SUBTRACT)
        with BuildLine():
            Line((-65.1332163252, 39.6400615573), (-66.9280176258, 39.6400615573))
            Line((-66.9280176258, 39.6400615573), (-73.427882149, 56.6235785373))
            Line((-73.427882149, 56.6235785373), (-73.5327186736, 56.6235785373))
            add(Edge.make_bspline(
                [(-73.5327186736, 56.6235785373), (-73.3482063903, 54.6065238046), (-73.3482063903, 51.826259173)],
                knots=[0, 0, 0, 1, 1, 1], degree=2))
            Line((-73.3482063903, 51.826259173), (-73.3482063903, 39.6400615573))
            Line((-73.3482063903, 39.6400615573), (-75.4071957328, 39.6400615573))
            Line((-75.4071957328, 39.6400615573), (-75.4071957328, 58.7999847873))
            Line((-75.4071957328, 58.7999847873), (-72.0524269467, 58.7999847873))
            Line((-72.0524269467, 58.7999847873), (-65.9844889047, 42.9948303435))
            Line((-65.9844889047, 42.9948303435), (-65.8796523801, 42.9948303435))
            Line((-65.8796523801, 42.9948303435), (-59.7613928063, 58.7999847873))
            Line((-59.7613928063, 58.7999847873), (-56.4317847861, 58.7999847873))
            Line((-56.4317847861, 58.7999847873), (-56.4317847861, 39.6400615573))
            Line((-56.4317847861, 39.6400615573), (-58.6585125679, 39.6400615573))
            Line((-58.6585125679, 39.6400615573), (-58.6585125679, 51.9856106904))
            add(Edge.make_bspline(
                [(-58.6585125679, 51.9856106904), (-58.6585125679, 54.1075019476), (-58.4740002847, 56.5984177714)],
                knots=[0, 0, 0, 1, 1, 1], degree=2))
            Line((-58.4740002847, 56.5984177714), (-58.5788368092, 56.5984177714))
            Line((-58.5788368092, 56.5984177714), (-65.1332163252, 39.6400615573))
        make_face(mode=Mode.SUBTRACT)
        with Locations((-99.5902121067, 68.4210244134)):
            Circle(F0_R_2, mode=Mode.SUBTRACT)
        Polygon((-37.8463657107, 49.7295286817), (-31.4513377121, 39.6400615573), (-33.9799946847, 39.6400615573), (-39.1295647714, 48.0647246716), (-44.3713909998, 39.6400615573), (-46.7323095331, 39.6400615573), (-40.3624423003, 49.654046384), (-46.3003830519, 58.7999847873), (-43.834627994, 58.7999847873), (-39.0792432396, 51.2098204086), (-34.2819238754, 58.7999847873), (-31.9126184202, 58.7999847873), align=None, mode=Mode.SUBTRACT)
        with Locations((-27.5996437995, 49.2200231723)):
            Rectangle(F0_W, F0_H, mode=Mode.SUBTRACT)
        with Locations((-20.1185094063, 49.2200231723)):
            Rectangle(F0_W, F0_H, mode=Mode.SUBTRACT)
        with Locations((3.8105277345, 48.3325049281)):
            Circle(F0_R_2, mode=Mode.SUBTRACT)
        with Locations((3.8105277345, 68.4210244134)):
            Circle(F0_R_2, mode=Mode.SUBTRACT)
        with Locations((10.9275467694, 48.3325049281)):
            Circle(F0_R_2, mode=Mode.SUBTRACT)
        with Locations((18.1994624436, 48.3325049281)):
            Circle(F0_R_2, mode=Mode.SUBTRACT)
        with Locations((10.9275467694, 68.4210244134)):
            Circle(F0_R_2, mode=Mode.SUBTRACT)
        with Locations((18.1994624436, 68.4210244134)):
            Circle(F0_R_2, mode=Mode.SUBTRACT)
        Polygon((-119.0419751526, -61.6089515388), (-119.0419751526, -32.1499912984), (-147.7496829089, -52.1716674367), (-152.0327921053, -81.8643428906), (-137.0507371719, -95.1134194612), (-129.0419751526, -66.2021806272), align=None)
        Polygon((51.4399430895, -52.2823932228), (23.4399430895, -31.2823932228), (23.4399430895, -61.6089515388), (33.4399430895, -66.2021806272), (41.4487051088, -95.1134194612), (56.4307600421, -81.8643428906), align=None)
    extrude(amount=F2_DEPTH)


with BuildPart() as f2:
    # F0 (on Front) → F2, piece 2 (new body)
    with BuildSketch(Plane.XZ):
        with BuildLine():
            ThreePointArc((-47.184005962, 78.4210244134), (-47.2782065268, 78.6484446944), (-47.5056268078, 78.7426452592))
            Line((-47.5056268078, 78.7426452592), (-47.5056268078, 78.4210244134))
            Line((-47.5056268078, 78.4210244134), (-47.184005962, 78.4210244134))
        make_face()
        with BuildLine():
            Line((-47.5056268078, 78.4210244134), (-47.5056268078, 78.7426452592))
            ThreePointArc((-47.5056268078, 78.7426452592), (-47.7330470888, 78.6484446944), (-47.8272476536, 78.4210244134))
            Line((-47.8272476536, 78.4210244134), (-47.5056268078, 78.4210244134))
        make_face()
        with BuildLine():
            Line((-47.184005962, 78.4210244134), (-47.5056268078, 78.4210244134))
            Line((-47.5056268078, 78.4210244134), (-47.5056268078, 78.0994035676))
            ThreePointArc((-47.5056268078, 78.0994035676), (-47.2782065268, 78.1936041324), (-47.184005962, 78.4210244134))
        make_face()
        with BuildLine():
            Line((-47.5056268078, 78.0994035676), (-47.5056268078, 78.4210244134))
            Line((-47.5056268078, 78.4210244134), (-47.8272476536, 78.4210244134))
            ThreePointArc((-47.8272476536, 78.4210244134), (-47.7330470888, 78.1936041324), (-47.5056268078, 78.0994035676))
        make_face()
    extrude(amount=F2_DEPTH)


solid = Compound([f1.part, f2.part])
